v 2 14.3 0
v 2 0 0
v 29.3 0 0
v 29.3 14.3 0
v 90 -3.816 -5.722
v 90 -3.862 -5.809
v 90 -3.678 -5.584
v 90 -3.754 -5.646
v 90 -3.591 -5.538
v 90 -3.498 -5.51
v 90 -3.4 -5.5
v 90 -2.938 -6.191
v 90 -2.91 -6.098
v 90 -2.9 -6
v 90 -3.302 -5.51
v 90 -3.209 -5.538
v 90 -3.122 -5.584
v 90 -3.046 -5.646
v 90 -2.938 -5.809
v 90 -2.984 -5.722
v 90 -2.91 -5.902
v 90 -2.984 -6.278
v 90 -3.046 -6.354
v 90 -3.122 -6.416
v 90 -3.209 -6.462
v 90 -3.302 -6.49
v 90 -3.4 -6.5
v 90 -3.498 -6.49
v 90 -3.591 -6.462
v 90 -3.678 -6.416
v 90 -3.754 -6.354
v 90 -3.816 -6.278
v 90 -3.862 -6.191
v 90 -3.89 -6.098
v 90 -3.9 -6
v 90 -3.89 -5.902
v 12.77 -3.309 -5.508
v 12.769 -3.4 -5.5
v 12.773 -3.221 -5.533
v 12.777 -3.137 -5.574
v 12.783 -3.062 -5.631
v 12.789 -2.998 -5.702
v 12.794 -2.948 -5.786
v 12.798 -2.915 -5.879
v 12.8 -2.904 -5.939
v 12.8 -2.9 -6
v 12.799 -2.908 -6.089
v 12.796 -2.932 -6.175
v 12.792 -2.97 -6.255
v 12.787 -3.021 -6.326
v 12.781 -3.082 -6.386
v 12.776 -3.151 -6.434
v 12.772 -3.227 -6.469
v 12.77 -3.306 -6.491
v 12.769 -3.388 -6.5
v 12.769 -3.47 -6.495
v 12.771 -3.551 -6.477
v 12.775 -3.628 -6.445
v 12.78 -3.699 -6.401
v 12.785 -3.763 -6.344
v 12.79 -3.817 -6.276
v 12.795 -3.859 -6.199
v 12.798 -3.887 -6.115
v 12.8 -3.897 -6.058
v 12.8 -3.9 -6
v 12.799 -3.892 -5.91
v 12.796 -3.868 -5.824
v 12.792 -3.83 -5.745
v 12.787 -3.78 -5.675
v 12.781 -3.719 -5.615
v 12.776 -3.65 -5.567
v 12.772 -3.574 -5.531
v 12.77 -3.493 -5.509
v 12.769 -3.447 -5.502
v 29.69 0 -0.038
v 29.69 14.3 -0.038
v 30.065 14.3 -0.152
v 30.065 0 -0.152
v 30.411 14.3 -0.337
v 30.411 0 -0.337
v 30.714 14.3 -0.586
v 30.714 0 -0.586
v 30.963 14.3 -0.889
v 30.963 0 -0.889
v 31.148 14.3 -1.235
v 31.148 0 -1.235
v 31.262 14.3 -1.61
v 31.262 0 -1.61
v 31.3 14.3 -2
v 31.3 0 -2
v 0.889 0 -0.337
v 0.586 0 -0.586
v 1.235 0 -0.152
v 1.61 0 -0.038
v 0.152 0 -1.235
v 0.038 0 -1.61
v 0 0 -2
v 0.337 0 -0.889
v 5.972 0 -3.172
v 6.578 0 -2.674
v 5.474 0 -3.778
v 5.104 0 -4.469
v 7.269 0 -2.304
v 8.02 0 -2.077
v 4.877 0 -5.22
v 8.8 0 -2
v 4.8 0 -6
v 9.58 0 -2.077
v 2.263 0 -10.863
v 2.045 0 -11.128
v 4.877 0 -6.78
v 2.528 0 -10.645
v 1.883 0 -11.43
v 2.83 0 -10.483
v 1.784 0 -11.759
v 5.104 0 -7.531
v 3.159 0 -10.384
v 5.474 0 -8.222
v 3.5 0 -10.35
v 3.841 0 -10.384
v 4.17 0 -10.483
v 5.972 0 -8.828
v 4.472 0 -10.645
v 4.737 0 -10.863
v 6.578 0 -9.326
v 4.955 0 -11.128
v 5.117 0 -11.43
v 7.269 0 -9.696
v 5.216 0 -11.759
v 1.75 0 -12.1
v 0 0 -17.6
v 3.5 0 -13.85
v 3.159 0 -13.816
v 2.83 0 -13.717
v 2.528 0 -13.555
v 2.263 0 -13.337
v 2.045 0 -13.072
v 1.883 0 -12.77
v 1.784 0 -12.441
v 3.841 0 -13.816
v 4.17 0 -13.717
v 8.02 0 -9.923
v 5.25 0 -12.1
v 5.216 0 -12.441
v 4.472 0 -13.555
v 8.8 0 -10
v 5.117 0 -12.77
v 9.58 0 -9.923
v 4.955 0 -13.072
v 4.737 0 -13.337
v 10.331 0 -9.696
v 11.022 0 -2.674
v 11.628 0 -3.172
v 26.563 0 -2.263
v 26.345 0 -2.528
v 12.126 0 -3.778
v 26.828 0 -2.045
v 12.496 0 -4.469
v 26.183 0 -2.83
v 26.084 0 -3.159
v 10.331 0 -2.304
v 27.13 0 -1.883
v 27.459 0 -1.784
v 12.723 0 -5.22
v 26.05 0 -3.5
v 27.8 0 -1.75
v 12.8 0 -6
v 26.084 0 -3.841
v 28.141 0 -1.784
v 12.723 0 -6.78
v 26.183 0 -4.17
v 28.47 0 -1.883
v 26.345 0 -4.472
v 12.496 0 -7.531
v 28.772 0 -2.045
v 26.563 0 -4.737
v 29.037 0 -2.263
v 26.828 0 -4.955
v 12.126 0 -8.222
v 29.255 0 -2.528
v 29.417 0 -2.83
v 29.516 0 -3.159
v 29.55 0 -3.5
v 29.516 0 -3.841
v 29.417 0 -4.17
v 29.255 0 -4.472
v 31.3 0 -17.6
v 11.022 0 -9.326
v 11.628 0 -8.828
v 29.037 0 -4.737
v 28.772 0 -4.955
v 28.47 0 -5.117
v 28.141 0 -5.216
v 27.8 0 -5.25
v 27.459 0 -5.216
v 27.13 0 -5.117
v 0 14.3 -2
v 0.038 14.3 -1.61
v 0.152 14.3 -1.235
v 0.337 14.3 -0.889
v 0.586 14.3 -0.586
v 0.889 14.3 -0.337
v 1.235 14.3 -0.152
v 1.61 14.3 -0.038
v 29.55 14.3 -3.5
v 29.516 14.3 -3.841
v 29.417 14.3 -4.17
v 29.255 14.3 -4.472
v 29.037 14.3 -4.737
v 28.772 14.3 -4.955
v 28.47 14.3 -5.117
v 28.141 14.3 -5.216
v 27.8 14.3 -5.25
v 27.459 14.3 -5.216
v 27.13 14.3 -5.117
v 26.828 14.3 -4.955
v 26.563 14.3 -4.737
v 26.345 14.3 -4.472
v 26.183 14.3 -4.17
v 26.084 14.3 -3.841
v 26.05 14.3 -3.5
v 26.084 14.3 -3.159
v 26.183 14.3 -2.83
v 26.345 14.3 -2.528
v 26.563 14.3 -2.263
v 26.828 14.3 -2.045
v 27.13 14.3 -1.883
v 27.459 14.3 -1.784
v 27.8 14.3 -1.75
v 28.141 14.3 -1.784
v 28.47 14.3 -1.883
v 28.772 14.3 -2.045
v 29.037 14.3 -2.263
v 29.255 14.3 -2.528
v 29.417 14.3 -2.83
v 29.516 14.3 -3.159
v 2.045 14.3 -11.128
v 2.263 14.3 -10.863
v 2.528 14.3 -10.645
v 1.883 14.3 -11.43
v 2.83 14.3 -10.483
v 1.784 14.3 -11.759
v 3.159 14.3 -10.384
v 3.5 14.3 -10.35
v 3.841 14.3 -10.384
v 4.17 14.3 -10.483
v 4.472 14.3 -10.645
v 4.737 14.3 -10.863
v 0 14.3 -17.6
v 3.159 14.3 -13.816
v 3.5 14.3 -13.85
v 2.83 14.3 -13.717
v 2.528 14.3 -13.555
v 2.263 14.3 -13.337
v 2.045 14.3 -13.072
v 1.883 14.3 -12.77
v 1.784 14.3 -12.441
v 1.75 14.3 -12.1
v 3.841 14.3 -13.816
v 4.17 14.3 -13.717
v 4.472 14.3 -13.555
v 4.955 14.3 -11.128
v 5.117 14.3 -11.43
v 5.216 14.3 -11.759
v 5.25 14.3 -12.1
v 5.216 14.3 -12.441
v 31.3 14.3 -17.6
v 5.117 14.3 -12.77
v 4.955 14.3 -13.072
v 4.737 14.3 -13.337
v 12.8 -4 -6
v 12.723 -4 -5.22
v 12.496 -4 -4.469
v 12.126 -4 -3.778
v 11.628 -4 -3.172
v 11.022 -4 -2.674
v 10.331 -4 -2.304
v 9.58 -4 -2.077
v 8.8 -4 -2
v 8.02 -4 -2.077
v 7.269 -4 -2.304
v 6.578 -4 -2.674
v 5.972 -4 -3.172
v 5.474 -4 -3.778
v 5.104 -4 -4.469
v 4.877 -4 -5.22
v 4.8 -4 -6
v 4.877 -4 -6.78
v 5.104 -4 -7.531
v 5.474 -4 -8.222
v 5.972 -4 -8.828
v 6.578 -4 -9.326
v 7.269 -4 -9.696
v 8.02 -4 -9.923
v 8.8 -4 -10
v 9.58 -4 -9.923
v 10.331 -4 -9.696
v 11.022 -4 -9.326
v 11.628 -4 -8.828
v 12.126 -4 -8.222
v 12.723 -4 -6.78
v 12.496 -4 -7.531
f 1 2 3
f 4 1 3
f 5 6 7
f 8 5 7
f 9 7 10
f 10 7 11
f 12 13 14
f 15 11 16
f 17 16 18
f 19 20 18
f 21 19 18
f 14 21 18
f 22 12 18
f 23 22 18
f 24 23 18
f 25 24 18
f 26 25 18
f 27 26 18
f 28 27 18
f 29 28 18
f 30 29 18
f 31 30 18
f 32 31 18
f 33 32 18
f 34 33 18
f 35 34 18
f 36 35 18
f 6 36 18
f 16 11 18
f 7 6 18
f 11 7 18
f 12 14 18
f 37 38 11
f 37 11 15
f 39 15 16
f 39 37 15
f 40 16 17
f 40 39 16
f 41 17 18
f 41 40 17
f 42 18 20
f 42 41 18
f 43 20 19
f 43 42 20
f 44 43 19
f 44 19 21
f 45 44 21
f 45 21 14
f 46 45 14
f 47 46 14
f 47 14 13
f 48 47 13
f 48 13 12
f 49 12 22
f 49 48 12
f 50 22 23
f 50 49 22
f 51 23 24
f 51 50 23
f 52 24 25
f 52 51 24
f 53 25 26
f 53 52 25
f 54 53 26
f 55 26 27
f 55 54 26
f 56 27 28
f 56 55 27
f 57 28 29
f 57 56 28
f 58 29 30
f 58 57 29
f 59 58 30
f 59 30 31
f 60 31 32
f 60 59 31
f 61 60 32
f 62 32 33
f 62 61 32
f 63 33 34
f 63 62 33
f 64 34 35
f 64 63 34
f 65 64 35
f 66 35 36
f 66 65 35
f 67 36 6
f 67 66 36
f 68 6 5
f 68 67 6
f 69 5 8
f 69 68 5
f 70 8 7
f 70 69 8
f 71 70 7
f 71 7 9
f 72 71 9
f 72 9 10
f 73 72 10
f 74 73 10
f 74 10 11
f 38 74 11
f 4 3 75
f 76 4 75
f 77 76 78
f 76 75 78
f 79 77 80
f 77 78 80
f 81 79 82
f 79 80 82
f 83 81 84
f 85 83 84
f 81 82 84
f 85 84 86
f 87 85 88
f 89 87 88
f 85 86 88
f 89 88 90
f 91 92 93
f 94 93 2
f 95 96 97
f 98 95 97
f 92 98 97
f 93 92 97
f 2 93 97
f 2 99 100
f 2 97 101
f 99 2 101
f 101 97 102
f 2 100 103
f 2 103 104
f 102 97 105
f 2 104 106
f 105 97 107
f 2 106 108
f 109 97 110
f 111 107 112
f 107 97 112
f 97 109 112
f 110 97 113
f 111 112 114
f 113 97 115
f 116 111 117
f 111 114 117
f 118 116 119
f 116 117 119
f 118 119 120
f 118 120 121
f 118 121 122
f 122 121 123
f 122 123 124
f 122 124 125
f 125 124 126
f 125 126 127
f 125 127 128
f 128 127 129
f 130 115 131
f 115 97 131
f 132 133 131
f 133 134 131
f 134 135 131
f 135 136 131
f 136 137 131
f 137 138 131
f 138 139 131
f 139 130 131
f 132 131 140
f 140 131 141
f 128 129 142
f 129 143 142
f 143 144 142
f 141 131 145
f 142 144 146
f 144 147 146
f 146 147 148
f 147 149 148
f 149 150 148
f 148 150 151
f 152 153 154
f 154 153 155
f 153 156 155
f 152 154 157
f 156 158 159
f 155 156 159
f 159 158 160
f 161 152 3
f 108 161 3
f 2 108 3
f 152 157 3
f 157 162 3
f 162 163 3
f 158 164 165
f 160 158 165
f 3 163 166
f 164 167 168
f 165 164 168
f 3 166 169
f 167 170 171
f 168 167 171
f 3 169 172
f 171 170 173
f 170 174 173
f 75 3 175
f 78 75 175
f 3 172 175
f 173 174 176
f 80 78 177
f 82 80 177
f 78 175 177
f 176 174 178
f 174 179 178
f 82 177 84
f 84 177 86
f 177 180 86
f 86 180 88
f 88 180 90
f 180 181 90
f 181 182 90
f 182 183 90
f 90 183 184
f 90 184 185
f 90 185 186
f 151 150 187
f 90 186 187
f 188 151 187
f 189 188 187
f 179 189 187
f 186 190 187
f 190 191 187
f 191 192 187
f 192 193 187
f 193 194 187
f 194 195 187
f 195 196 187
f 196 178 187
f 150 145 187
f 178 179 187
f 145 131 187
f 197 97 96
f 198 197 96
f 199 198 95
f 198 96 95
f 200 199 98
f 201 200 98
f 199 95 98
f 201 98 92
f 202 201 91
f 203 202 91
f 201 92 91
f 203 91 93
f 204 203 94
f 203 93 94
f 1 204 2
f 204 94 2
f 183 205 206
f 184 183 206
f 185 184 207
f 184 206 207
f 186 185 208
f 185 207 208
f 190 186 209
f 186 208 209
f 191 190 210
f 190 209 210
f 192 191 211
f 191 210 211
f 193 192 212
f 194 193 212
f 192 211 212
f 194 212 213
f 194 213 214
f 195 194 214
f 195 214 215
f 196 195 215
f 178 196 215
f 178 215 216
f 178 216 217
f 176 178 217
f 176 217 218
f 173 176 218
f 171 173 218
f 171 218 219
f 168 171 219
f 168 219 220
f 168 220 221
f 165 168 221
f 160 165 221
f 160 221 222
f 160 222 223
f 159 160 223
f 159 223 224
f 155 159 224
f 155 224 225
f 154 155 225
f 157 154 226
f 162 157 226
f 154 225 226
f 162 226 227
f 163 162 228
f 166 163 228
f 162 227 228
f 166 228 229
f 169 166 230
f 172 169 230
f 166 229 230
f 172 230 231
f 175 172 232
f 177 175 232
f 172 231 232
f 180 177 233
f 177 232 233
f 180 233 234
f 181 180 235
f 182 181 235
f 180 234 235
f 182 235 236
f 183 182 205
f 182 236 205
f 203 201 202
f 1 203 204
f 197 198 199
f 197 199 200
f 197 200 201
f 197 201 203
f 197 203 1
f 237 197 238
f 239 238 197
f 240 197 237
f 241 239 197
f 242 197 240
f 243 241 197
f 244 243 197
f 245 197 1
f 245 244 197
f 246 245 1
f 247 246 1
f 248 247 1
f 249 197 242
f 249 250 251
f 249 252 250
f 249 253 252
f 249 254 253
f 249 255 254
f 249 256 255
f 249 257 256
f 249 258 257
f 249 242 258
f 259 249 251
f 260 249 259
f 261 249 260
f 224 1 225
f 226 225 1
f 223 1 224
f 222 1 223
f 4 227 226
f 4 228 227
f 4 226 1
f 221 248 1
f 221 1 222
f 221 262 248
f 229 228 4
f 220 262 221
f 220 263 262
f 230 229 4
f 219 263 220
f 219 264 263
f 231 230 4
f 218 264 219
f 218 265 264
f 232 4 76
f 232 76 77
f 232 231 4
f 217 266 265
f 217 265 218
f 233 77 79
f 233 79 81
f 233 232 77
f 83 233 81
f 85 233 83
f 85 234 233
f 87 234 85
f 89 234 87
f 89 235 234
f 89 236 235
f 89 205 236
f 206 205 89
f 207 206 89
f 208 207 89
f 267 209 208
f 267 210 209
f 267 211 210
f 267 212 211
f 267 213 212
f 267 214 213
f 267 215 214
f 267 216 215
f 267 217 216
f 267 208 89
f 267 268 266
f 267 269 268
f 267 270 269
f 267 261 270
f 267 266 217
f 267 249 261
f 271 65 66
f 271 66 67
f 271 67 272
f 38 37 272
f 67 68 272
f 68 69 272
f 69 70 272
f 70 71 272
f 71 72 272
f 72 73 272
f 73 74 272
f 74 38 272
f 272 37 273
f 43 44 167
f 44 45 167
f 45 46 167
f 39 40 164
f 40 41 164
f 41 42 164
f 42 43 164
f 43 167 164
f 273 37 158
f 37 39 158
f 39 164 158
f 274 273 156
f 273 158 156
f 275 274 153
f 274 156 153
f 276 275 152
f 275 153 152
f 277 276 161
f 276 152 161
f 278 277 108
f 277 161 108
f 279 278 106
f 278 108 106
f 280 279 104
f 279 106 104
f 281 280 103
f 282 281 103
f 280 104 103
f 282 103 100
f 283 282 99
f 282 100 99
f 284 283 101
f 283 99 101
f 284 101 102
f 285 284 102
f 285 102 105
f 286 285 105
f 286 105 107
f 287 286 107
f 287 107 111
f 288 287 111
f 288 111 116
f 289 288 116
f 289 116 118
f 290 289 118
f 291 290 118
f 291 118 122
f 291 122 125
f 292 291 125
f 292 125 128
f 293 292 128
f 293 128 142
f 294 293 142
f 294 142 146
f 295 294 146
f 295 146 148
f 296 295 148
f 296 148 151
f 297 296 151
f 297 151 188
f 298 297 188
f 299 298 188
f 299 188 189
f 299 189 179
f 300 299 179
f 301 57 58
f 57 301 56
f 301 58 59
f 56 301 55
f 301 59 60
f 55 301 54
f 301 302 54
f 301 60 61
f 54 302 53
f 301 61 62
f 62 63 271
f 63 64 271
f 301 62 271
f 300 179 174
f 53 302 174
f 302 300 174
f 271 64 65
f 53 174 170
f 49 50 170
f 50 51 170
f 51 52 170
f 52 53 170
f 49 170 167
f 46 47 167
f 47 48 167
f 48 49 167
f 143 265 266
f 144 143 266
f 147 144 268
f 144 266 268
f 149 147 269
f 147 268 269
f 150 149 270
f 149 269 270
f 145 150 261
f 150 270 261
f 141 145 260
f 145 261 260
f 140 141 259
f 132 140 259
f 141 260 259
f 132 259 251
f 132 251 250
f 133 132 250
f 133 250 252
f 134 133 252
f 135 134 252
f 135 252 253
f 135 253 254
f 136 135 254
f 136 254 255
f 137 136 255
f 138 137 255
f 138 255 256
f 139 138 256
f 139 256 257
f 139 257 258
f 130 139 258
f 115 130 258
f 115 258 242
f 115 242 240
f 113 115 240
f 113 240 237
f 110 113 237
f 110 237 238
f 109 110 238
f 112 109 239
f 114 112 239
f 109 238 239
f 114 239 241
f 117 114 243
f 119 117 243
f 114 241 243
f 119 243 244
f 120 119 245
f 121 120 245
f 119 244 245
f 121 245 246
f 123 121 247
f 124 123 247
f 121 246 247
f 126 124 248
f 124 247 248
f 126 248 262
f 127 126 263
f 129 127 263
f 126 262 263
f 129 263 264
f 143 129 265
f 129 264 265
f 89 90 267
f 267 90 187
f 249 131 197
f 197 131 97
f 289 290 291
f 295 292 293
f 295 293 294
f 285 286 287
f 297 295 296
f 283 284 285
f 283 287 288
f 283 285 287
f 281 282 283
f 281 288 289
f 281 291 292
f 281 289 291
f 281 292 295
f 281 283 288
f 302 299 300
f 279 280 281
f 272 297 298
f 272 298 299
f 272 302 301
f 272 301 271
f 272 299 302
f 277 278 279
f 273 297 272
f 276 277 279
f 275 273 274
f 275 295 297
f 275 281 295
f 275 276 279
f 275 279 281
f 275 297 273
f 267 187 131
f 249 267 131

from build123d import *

# Parameters (mm, degrees)
EXTRUDE_1_DEPTH     = 14.3
SKETCH_2_R          = 1.75
CUT_EXTRUDE_1_DEPTH = 15.3
SKETCH_3_R          = 4
EXTRUDE_2_DEPTH     = 4
EXTRUDE_START       = -10
SKETCH_4_R          = 0.5
EXTRUDE_3_DEPTH     = 80


with BuildPart() as part:
    # 草圖1 → 填料-伸長1 (new body)
    with BuildSketch(Plane(origin=(0, 0, 0), x_dir=(1, 0, 0), z_dir=(0, 1, 0))):
        with BuildLine():
            Line((2, 0), (29.3, 0))
            ThreePointArc((29.3, 0), (30.714213562, 0.585786438), (31.3, 2))
            Line((31.3, 2), (31.3, 17.6))
            Line((31.3, 17.6), (0, 17.6))
            Line((0, 17.6), (0, 2))
            ThreePointArc((0, 2), (0.585786438, 0.585786438), (2, 0))
        make_face()
    extrude(amount=EXTRUDE_1_DEPTH)

    # 草圖2 → 除料-伸長1 (cut, through all)
    with BuildSketch(Plane(origin=(0, 14.3, 0), x_dir=(1, 0, 0), z_dir=(0, 1, 0))):
        with Locations((27.8, 3.5)):
            Circle(SKETCH_2_R)
        with Locations((3.5, 12.1)):
            Circle(SKETCH_2_R)
    extrude(amount=-CUT_EXTRUDE_1_DEPTH, mode=Mode.SUBTRACT)

    # 草圖3 → 填料-伸長2 (add)
    with BuildSketch(Plane.XZ):
        with Locations((8.8, -6)):
            Circle(SKETCH_3_R)
    extrude(amount=EXTRUDE_2_DEPTH)

    # 草圖4 → 填料-伸長3 (add)
    with BuildSketch(Plane.ZY.offset(EXTRUDE_START)):
        with Locations((-6, -3.4)):
            Circle(SKETCH_4_R)
    extrude(amount=-EXTRUDE_3_DEPTH)


solid = part.part
